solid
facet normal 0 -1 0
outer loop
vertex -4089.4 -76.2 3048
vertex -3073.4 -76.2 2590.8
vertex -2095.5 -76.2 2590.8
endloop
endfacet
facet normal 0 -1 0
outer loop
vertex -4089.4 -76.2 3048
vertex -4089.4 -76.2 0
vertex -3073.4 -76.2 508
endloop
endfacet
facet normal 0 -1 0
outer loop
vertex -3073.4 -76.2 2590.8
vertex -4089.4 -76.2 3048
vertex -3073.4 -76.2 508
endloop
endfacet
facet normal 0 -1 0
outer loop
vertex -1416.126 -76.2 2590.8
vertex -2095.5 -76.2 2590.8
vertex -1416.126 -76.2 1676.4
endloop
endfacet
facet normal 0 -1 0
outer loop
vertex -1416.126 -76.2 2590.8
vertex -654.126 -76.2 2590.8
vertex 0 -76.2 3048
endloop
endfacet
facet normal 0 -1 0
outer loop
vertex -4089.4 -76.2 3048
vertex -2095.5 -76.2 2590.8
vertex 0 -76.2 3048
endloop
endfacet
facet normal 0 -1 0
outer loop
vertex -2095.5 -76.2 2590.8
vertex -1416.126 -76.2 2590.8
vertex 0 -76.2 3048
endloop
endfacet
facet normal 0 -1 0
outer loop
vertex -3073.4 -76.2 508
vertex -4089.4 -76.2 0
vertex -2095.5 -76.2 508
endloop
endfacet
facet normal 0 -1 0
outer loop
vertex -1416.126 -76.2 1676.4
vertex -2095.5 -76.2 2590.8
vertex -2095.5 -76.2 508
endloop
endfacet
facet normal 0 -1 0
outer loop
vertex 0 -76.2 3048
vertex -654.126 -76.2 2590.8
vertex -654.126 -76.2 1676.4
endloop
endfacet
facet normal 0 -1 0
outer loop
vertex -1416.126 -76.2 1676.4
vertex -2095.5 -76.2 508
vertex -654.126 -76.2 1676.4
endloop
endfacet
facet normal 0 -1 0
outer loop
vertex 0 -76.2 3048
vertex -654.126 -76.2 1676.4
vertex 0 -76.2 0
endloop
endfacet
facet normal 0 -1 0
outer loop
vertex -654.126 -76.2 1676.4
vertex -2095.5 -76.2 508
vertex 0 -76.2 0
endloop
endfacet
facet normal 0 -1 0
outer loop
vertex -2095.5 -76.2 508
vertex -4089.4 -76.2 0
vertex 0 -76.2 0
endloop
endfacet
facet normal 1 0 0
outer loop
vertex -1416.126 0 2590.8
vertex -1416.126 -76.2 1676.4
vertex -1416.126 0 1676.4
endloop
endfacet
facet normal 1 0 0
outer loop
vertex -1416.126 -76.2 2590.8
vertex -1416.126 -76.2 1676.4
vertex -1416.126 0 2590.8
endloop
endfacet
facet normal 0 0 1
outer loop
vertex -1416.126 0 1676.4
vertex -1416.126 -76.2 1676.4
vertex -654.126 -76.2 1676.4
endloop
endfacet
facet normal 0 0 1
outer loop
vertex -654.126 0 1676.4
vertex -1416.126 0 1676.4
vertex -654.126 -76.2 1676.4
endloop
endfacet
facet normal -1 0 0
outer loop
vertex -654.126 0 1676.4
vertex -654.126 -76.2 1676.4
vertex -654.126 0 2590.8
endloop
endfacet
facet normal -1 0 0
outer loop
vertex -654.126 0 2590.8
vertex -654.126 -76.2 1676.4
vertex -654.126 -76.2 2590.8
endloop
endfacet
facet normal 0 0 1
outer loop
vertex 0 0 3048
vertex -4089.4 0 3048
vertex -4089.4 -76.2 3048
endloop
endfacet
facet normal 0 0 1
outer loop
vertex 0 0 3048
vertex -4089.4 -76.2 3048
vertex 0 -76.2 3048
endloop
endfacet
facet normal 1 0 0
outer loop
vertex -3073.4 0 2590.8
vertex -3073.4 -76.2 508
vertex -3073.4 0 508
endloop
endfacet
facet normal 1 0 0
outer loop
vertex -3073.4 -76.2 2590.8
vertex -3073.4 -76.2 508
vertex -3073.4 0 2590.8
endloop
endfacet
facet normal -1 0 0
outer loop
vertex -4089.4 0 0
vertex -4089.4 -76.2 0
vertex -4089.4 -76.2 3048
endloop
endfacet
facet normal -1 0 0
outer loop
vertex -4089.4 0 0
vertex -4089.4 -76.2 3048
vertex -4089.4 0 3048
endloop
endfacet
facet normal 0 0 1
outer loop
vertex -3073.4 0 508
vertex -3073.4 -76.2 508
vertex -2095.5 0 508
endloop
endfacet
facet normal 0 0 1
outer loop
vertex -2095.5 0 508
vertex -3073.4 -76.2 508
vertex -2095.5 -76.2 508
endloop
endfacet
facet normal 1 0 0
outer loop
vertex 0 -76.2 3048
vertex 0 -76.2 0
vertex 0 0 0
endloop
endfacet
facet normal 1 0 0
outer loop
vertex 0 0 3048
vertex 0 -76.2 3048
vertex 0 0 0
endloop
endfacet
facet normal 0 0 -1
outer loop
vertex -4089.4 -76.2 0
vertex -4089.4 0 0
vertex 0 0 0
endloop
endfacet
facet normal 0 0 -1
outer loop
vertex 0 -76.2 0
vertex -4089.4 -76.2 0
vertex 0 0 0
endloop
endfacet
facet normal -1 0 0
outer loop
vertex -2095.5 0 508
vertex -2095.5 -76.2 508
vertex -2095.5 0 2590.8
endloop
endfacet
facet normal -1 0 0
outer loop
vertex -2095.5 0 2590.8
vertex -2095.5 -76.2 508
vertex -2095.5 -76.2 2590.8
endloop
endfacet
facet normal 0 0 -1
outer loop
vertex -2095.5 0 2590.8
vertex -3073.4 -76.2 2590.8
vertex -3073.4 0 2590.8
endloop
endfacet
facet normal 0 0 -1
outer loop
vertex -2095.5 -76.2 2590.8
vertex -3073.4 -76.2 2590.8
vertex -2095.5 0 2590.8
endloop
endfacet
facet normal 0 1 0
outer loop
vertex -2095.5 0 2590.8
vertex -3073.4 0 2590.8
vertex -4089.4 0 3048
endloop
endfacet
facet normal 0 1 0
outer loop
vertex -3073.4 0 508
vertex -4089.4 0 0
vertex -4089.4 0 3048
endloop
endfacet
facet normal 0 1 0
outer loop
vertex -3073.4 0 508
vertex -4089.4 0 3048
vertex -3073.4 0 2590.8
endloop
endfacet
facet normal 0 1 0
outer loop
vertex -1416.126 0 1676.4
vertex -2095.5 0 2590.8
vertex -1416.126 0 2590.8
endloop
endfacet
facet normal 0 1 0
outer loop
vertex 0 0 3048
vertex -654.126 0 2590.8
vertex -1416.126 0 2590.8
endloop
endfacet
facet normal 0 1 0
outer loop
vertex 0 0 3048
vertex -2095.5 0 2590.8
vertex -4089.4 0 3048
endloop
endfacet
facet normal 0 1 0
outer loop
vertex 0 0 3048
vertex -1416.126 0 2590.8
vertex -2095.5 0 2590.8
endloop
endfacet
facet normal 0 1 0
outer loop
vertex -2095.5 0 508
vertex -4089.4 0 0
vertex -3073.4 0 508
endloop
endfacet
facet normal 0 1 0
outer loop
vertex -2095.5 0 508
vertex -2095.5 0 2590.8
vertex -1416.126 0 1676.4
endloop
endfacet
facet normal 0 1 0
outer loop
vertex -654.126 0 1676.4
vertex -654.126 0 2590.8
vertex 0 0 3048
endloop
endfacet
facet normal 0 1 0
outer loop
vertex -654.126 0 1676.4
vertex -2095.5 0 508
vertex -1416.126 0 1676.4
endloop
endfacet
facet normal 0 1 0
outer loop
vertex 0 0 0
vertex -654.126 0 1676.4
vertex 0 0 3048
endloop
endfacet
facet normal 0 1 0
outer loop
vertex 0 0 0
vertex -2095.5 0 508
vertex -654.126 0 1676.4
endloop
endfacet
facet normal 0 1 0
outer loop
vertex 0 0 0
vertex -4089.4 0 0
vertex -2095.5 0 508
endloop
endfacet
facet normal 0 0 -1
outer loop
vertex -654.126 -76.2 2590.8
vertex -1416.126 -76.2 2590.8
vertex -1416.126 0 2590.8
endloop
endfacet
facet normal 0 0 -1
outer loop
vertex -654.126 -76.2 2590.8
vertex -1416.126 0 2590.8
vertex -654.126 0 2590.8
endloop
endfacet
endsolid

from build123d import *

# Parameters (mm, degrees)
F0_W     = 4089.4
F0_H     = 76.2
F1_DEPTH = 3048
F2_W     = 977.9
F2_H     = 2082.8
F3_DEPTH = 76.2
F4_W     = 762
F4_H     = 914.4
F5_DEPTH = 76.2


with BuildPart() as f1:
    # F0 (on Top) → F1 (new body)
    with BuildSketch(Plane.XY):
        with Locations((-2044.7, -38.1)):
            Rectangle(F0_W, F0_H)
    extrude(amount=F1_DEPTH)

    # F2 (on face) → F3 (cut, through all)
    with BuildSketch(Plane.XZ.offset(76.2)):
        with Locations((-2584.45, 1549.4)):
            Rectangle(F2_W, F2_H)
    extrude(amount=-F3_DEPTH, mode=Mode.SUBTRACT)

    # F4 (on face) → F5 (cut, through all)
    with BuildSketch(Plane.XZ.offset(76.2)):
        with Locations((-1035.126132, 2133.6)):
            Rectangle(F4_W, F4_H)
    extrude(amount=-F5_DEPTH, mode=Mode.SUBTRACT)


solid = f1.part
